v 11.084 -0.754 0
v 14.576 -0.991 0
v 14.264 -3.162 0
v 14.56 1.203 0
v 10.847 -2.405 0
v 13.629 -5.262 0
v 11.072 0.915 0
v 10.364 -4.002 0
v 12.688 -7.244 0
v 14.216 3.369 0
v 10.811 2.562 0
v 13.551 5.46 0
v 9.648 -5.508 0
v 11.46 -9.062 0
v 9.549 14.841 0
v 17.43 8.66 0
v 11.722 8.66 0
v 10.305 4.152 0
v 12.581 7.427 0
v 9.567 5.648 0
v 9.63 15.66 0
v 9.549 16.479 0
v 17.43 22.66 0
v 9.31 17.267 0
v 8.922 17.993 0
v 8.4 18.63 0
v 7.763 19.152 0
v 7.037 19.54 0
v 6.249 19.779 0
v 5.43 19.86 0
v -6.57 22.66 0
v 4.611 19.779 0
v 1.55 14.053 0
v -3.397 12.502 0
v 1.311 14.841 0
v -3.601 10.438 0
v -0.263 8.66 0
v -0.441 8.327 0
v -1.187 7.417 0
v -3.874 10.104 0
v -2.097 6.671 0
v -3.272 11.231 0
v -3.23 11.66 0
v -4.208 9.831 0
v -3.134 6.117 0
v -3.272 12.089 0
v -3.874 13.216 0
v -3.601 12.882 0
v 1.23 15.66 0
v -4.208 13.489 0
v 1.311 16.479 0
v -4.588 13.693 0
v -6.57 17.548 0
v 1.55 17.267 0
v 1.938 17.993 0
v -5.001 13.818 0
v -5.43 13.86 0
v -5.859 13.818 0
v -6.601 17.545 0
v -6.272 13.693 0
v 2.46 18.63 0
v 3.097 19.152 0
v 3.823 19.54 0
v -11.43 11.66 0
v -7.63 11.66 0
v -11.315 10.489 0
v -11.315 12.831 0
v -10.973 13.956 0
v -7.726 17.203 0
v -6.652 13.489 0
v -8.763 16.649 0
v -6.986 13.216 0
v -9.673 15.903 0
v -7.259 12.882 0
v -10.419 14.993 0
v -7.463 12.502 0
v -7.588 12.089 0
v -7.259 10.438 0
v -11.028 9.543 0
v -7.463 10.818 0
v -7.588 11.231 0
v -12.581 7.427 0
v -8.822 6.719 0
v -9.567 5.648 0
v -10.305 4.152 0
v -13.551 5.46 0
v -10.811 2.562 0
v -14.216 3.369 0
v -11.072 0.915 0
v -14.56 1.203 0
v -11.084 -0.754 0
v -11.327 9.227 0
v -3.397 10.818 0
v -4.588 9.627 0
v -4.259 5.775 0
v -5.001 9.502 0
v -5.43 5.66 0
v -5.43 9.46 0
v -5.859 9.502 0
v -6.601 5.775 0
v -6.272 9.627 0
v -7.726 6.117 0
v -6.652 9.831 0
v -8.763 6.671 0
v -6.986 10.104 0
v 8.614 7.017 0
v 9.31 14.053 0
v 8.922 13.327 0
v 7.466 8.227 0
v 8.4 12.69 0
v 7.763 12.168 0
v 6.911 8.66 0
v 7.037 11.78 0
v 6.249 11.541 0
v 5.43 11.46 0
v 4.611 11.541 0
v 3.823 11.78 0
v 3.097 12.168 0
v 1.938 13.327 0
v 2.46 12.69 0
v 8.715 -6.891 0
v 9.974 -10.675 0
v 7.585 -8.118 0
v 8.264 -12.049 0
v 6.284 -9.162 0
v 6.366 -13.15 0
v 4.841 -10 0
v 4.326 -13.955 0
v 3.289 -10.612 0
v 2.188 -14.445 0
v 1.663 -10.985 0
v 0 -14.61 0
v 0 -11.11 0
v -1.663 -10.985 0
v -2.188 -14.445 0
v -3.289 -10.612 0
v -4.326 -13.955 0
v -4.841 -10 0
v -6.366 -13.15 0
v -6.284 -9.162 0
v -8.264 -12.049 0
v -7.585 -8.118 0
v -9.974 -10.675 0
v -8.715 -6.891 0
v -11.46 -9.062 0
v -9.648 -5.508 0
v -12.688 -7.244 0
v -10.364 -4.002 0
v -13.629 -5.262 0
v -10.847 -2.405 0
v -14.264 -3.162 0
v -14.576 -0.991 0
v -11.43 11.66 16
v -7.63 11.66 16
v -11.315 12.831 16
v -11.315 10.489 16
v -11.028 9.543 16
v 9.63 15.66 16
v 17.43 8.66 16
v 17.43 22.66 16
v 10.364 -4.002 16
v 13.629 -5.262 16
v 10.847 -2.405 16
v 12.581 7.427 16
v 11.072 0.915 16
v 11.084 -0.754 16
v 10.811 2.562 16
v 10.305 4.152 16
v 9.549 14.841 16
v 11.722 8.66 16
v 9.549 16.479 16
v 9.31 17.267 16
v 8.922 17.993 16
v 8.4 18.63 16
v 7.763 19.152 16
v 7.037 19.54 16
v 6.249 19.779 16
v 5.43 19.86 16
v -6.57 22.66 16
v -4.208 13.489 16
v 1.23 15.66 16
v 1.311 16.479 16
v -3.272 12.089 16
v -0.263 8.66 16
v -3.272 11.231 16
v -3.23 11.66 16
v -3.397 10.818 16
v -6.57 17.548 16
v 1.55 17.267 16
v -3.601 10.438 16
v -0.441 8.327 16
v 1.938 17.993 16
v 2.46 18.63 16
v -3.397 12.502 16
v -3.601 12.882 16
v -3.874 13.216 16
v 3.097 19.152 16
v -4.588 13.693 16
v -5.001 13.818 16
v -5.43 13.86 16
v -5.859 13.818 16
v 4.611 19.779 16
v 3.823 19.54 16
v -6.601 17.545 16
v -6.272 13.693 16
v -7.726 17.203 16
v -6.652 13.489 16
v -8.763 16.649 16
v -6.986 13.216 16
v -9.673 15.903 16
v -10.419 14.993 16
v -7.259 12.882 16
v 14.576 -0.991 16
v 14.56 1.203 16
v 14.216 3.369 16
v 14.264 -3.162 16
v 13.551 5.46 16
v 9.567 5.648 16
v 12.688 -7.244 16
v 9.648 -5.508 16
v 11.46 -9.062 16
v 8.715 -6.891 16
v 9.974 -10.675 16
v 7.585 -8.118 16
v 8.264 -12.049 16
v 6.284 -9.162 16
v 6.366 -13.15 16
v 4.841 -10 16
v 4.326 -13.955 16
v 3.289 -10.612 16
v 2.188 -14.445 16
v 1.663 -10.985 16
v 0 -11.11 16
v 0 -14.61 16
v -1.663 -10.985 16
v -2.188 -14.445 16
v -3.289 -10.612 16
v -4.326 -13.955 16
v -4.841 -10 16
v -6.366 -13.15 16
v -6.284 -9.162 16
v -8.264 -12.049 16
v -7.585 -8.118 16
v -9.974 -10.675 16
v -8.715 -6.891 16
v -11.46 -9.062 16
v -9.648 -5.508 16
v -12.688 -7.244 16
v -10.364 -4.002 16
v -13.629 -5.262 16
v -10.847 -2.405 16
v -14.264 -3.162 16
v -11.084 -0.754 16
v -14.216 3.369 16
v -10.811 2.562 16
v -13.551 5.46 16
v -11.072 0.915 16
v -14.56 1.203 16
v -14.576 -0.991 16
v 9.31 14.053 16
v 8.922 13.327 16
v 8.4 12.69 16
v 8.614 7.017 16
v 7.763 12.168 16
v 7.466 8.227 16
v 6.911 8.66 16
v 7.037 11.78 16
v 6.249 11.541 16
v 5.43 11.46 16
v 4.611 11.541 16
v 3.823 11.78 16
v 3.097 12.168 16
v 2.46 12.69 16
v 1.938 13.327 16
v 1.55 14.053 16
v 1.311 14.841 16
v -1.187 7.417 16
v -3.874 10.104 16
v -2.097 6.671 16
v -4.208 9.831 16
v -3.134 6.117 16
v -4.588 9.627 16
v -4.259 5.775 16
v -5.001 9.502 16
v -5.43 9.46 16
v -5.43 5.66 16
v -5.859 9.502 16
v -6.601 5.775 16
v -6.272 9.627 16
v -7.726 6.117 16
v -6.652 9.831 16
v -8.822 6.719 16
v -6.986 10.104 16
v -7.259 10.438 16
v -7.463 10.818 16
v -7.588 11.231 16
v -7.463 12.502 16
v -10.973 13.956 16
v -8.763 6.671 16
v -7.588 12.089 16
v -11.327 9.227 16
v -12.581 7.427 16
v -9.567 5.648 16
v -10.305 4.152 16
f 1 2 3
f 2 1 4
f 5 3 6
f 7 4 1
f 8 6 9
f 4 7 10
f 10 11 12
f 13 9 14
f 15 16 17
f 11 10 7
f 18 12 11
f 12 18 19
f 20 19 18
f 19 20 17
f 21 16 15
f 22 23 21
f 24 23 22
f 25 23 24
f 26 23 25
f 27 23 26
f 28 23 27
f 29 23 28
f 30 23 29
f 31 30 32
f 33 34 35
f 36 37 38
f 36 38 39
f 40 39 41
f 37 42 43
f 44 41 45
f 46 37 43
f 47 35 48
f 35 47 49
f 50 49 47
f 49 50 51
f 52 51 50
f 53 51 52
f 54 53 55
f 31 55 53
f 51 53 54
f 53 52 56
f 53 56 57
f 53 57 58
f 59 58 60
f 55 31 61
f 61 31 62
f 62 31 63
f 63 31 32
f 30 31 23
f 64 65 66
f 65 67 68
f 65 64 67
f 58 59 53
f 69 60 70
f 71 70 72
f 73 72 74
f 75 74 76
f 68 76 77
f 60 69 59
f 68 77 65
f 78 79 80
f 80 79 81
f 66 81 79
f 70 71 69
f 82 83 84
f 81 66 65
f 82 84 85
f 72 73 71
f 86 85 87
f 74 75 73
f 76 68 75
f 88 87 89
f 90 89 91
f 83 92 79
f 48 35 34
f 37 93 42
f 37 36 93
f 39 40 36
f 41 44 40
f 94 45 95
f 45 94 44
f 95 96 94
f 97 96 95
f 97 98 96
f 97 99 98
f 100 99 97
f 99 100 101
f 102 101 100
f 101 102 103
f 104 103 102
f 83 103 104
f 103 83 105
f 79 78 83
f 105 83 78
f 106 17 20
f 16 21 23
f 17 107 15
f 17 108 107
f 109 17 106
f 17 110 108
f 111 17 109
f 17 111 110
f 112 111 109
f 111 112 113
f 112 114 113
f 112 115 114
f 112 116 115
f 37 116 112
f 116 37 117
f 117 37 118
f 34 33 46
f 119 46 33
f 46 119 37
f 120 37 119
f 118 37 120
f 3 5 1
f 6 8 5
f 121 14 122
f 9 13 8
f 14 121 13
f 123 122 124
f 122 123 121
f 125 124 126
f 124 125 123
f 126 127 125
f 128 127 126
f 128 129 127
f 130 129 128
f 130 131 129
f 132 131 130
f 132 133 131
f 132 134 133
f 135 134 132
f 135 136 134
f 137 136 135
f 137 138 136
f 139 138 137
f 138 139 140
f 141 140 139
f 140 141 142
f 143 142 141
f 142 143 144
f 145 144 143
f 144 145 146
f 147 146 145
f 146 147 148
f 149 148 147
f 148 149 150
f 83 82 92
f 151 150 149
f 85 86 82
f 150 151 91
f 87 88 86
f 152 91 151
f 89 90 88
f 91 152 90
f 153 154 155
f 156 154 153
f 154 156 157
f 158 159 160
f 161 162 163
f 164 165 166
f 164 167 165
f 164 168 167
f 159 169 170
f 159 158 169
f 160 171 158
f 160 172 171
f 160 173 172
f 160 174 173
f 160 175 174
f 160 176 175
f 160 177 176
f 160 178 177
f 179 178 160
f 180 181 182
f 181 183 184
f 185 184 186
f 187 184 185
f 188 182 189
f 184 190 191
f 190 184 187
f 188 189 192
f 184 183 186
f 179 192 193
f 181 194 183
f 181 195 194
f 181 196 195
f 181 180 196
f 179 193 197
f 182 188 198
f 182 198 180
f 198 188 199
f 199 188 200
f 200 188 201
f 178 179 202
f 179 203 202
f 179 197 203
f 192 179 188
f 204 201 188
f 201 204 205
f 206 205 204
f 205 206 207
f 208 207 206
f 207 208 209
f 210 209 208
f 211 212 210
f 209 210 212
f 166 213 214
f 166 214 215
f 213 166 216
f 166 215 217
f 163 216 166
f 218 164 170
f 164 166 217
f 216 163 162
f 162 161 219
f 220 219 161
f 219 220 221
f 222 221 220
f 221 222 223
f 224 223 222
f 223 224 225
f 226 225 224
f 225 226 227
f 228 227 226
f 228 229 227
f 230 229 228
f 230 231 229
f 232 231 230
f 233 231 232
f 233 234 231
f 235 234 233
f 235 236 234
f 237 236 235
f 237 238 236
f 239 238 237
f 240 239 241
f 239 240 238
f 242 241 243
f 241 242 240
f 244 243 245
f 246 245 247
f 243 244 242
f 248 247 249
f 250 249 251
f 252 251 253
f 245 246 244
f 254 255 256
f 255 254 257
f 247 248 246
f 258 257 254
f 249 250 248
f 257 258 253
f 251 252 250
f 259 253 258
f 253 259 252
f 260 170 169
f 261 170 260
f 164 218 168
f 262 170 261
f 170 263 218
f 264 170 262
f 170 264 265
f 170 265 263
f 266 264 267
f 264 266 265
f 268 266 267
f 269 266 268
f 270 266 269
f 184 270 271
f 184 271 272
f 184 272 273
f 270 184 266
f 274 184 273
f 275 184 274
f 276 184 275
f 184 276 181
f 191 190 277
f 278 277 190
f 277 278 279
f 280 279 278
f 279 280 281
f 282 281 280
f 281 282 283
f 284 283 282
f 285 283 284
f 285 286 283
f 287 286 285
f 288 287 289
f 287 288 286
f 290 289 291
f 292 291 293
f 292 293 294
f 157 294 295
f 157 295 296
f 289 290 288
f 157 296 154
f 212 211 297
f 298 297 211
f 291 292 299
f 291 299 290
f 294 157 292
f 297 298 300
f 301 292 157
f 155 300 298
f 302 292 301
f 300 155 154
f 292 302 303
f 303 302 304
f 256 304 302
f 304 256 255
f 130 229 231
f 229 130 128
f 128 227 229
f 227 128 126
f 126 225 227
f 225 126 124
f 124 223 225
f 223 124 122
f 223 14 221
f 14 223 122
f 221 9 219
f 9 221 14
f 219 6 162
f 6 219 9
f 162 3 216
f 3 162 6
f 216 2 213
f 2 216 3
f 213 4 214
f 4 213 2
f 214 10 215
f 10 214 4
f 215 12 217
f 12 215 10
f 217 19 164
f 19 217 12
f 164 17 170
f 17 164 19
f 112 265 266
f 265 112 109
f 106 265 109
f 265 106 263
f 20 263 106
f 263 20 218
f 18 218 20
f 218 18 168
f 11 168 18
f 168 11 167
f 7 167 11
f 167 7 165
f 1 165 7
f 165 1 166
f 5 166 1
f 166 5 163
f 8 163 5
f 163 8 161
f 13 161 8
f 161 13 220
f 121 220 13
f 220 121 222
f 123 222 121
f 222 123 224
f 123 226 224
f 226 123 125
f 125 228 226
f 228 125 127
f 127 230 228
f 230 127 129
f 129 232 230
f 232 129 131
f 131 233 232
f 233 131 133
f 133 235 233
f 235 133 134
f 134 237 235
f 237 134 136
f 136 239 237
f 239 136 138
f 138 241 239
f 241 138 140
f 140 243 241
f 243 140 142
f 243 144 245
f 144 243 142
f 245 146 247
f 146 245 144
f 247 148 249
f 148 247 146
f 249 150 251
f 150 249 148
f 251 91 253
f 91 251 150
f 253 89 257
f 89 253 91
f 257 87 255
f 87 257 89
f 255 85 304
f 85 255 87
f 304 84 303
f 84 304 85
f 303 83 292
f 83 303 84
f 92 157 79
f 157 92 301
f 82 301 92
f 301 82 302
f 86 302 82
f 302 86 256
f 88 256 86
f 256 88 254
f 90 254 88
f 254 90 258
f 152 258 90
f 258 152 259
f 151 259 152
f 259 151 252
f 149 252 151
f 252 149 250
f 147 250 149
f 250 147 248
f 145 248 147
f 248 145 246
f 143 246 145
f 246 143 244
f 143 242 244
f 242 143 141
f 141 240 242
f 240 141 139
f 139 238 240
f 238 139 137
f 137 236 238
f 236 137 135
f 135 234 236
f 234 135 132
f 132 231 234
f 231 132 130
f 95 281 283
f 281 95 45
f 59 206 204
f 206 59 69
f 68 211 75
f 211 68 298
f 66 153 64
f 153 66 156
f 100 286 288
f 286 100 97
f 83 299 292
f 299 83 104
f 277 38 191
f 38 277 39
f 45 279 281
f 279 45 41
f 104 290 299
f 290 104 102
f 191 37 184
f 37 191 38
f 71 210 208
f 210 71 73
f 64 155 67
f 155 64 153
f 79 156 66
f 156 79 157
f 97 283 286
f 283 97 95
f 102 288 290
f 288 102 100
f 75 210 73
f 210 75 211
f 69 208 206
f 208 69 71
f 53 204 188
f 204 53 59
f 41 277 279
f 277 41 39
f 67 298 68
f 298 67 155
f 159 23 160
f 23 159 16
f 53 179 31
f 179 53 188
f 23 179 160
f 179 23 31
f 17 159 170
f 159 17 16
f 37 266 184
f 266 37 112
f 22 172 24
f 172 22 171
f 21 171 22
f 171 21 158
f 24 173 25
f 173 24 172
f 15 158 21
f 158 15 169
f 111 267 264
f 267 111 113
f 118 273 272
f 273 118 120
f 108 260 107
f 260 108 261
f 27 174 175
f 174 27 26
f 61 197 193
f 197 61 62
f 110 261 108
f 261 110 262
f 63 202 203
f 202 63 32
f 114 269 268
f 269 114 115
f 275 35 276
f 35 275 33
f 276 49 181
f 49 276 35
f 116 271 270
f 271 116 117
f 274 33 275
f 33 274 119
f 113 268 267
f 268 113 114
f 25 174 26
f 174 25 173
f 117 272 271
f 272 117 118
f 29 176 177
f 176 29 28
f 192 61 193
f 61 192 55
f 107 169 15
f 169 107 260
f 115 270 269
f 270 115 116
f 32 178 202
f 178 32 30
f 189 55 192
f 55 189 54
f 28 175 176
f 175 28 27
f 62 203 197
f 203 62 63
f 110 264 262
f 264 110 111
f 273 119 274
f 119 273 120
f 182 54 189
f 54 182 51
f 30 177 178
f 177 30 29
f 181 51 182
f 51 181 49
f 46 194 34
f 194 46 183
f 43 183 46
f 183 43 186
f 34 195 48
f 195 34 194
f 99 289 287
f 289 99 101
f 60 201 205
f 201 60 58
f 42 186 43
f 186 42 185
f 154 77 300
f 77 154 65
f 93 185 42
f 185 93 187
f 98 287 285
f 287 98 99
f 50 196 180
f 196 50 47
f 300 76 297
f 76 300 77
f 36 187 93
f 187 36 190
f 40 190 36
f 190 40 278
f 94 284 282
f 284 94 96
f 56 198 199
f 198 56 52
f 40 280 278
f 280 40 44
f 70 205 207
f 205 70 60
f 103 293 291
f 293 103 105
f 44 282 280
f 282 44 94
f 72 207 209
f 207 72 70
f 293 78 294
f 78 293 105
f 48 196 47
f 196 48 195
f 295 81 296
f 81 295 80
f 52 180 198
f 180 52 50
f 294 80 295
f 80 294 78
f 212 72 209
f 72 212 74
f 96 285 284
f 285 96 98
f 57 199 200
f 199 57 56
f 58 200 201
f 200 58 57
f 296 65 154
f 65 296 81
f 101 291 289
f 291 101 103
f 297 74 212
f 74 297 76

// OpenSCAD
$fn = 32;

// ----------------------------------------------------------------------
// Pipe clamp: 29.22 mm ring, 3.5 mm wall, 16 mm wide
// ----------------------------------------------------------------------

// --- parameters (mm) ---
outer_r = 14.61;          // clamp outside radius
inner_r = 11.11;          // pipe bore radius
band = 3.5;               // band thickness
clamp_w = 16;             // clamp width
opening = 50;             // opening angle between the ends
lug_w = 24;               // lug width
lug_len = 14;             // lug length
bolt_d = 8.4;             // bolt hole
knuckle_d = 12;           // hinge knuckle diameter
pin_d = 4.4;              // hinge pin hole

clamp_profile = [[-6.174, 13.241], [-8.087, 12.167], [-9.818, 10.819], [-11.327, 9.227], [-12.581, 7.427], [-13.551, 5.46], [-14.216, 3.369], [-14.56, 1.203], [-14.576, -0.991], [-14.264, -3.162], [-13.629, -5.262], [-12.688, -7.244], [-11.46, -9.062], [-9.974, -10.675], [-8.264, -12.049], [-6.366, -13.15], [-4.326, -13.955], [-2.188, -14.445], [0, -14.61], [2.188, -14.445], [4.326, -13.955], [6.366, -13.15], [8.264, -12.049], [9.974, -10.675], [11.46, -9.062], [12.688, -7.244], [13.629, -5.262], [14.264, -3.162], [14.576, -0.991], [14.56, 1.203], [14.216, 3.369], [13.551, 5.46], [12.581, 7.427], [11.327, 9.227], [9.818, 10.819], [8.087, 12.167], [6.174, 13.241], [4.695, 10.069], [6.15, 9.253], [7.466, 8.227], [8.614, 7.017], [9.567, 5.648], [10.305, 4.152], [10.811, 2.562], [11.072, 0.915], [11.084, -0.754], [10.847, -2.405], [10.364, -4.002], [9.648, -5.508], [8.715, -6.891], [7.585, -8.118], [6.284, -9.162], [4.841, -10], [3.289, -10.612], [1.663, -10.985], [0, -11.11], [-1.663, -10.985], [-3.289, -10.612], [-4.841, -10], [-6.284, -9.162], [-7.585, -8.118], [-8.715, -6.891], [-9.648, -5.508], [-10.364, -4.002], [-10.847, -2.405], [-11.084, -0.754], [-11.072, 0.915], [-10.811, 2.562], [-10.305, 4.152], [-9.567, 5.648], [-8.614, 7.017], [-7.466, 8.227], [-6.15, 9.253], [-4.695, 10.069]];

difference() {
  union() {
    linear_extrude(height = clamp_w) polygon(clamp_profile);
    /* hinge knuckle, sunk 2 mm into the band end */
    translate([-5.43, 11.66, 0]) cylinder(h = clamp_w, d = knuckle_d);
    /* bolt lug on the other end */
    translate([-6.57, 8.66, 0]) cube([lug_w, 14, clamp_w]);
  }
  translate([5.43, 15.66, -2.5]) cylinder(h = clamp_w + 5, d = bolt_d);
  translate([-5.43, 11.66, -2.5]) cylinder(h = clamp_w + 5, d = pin_d);
}
